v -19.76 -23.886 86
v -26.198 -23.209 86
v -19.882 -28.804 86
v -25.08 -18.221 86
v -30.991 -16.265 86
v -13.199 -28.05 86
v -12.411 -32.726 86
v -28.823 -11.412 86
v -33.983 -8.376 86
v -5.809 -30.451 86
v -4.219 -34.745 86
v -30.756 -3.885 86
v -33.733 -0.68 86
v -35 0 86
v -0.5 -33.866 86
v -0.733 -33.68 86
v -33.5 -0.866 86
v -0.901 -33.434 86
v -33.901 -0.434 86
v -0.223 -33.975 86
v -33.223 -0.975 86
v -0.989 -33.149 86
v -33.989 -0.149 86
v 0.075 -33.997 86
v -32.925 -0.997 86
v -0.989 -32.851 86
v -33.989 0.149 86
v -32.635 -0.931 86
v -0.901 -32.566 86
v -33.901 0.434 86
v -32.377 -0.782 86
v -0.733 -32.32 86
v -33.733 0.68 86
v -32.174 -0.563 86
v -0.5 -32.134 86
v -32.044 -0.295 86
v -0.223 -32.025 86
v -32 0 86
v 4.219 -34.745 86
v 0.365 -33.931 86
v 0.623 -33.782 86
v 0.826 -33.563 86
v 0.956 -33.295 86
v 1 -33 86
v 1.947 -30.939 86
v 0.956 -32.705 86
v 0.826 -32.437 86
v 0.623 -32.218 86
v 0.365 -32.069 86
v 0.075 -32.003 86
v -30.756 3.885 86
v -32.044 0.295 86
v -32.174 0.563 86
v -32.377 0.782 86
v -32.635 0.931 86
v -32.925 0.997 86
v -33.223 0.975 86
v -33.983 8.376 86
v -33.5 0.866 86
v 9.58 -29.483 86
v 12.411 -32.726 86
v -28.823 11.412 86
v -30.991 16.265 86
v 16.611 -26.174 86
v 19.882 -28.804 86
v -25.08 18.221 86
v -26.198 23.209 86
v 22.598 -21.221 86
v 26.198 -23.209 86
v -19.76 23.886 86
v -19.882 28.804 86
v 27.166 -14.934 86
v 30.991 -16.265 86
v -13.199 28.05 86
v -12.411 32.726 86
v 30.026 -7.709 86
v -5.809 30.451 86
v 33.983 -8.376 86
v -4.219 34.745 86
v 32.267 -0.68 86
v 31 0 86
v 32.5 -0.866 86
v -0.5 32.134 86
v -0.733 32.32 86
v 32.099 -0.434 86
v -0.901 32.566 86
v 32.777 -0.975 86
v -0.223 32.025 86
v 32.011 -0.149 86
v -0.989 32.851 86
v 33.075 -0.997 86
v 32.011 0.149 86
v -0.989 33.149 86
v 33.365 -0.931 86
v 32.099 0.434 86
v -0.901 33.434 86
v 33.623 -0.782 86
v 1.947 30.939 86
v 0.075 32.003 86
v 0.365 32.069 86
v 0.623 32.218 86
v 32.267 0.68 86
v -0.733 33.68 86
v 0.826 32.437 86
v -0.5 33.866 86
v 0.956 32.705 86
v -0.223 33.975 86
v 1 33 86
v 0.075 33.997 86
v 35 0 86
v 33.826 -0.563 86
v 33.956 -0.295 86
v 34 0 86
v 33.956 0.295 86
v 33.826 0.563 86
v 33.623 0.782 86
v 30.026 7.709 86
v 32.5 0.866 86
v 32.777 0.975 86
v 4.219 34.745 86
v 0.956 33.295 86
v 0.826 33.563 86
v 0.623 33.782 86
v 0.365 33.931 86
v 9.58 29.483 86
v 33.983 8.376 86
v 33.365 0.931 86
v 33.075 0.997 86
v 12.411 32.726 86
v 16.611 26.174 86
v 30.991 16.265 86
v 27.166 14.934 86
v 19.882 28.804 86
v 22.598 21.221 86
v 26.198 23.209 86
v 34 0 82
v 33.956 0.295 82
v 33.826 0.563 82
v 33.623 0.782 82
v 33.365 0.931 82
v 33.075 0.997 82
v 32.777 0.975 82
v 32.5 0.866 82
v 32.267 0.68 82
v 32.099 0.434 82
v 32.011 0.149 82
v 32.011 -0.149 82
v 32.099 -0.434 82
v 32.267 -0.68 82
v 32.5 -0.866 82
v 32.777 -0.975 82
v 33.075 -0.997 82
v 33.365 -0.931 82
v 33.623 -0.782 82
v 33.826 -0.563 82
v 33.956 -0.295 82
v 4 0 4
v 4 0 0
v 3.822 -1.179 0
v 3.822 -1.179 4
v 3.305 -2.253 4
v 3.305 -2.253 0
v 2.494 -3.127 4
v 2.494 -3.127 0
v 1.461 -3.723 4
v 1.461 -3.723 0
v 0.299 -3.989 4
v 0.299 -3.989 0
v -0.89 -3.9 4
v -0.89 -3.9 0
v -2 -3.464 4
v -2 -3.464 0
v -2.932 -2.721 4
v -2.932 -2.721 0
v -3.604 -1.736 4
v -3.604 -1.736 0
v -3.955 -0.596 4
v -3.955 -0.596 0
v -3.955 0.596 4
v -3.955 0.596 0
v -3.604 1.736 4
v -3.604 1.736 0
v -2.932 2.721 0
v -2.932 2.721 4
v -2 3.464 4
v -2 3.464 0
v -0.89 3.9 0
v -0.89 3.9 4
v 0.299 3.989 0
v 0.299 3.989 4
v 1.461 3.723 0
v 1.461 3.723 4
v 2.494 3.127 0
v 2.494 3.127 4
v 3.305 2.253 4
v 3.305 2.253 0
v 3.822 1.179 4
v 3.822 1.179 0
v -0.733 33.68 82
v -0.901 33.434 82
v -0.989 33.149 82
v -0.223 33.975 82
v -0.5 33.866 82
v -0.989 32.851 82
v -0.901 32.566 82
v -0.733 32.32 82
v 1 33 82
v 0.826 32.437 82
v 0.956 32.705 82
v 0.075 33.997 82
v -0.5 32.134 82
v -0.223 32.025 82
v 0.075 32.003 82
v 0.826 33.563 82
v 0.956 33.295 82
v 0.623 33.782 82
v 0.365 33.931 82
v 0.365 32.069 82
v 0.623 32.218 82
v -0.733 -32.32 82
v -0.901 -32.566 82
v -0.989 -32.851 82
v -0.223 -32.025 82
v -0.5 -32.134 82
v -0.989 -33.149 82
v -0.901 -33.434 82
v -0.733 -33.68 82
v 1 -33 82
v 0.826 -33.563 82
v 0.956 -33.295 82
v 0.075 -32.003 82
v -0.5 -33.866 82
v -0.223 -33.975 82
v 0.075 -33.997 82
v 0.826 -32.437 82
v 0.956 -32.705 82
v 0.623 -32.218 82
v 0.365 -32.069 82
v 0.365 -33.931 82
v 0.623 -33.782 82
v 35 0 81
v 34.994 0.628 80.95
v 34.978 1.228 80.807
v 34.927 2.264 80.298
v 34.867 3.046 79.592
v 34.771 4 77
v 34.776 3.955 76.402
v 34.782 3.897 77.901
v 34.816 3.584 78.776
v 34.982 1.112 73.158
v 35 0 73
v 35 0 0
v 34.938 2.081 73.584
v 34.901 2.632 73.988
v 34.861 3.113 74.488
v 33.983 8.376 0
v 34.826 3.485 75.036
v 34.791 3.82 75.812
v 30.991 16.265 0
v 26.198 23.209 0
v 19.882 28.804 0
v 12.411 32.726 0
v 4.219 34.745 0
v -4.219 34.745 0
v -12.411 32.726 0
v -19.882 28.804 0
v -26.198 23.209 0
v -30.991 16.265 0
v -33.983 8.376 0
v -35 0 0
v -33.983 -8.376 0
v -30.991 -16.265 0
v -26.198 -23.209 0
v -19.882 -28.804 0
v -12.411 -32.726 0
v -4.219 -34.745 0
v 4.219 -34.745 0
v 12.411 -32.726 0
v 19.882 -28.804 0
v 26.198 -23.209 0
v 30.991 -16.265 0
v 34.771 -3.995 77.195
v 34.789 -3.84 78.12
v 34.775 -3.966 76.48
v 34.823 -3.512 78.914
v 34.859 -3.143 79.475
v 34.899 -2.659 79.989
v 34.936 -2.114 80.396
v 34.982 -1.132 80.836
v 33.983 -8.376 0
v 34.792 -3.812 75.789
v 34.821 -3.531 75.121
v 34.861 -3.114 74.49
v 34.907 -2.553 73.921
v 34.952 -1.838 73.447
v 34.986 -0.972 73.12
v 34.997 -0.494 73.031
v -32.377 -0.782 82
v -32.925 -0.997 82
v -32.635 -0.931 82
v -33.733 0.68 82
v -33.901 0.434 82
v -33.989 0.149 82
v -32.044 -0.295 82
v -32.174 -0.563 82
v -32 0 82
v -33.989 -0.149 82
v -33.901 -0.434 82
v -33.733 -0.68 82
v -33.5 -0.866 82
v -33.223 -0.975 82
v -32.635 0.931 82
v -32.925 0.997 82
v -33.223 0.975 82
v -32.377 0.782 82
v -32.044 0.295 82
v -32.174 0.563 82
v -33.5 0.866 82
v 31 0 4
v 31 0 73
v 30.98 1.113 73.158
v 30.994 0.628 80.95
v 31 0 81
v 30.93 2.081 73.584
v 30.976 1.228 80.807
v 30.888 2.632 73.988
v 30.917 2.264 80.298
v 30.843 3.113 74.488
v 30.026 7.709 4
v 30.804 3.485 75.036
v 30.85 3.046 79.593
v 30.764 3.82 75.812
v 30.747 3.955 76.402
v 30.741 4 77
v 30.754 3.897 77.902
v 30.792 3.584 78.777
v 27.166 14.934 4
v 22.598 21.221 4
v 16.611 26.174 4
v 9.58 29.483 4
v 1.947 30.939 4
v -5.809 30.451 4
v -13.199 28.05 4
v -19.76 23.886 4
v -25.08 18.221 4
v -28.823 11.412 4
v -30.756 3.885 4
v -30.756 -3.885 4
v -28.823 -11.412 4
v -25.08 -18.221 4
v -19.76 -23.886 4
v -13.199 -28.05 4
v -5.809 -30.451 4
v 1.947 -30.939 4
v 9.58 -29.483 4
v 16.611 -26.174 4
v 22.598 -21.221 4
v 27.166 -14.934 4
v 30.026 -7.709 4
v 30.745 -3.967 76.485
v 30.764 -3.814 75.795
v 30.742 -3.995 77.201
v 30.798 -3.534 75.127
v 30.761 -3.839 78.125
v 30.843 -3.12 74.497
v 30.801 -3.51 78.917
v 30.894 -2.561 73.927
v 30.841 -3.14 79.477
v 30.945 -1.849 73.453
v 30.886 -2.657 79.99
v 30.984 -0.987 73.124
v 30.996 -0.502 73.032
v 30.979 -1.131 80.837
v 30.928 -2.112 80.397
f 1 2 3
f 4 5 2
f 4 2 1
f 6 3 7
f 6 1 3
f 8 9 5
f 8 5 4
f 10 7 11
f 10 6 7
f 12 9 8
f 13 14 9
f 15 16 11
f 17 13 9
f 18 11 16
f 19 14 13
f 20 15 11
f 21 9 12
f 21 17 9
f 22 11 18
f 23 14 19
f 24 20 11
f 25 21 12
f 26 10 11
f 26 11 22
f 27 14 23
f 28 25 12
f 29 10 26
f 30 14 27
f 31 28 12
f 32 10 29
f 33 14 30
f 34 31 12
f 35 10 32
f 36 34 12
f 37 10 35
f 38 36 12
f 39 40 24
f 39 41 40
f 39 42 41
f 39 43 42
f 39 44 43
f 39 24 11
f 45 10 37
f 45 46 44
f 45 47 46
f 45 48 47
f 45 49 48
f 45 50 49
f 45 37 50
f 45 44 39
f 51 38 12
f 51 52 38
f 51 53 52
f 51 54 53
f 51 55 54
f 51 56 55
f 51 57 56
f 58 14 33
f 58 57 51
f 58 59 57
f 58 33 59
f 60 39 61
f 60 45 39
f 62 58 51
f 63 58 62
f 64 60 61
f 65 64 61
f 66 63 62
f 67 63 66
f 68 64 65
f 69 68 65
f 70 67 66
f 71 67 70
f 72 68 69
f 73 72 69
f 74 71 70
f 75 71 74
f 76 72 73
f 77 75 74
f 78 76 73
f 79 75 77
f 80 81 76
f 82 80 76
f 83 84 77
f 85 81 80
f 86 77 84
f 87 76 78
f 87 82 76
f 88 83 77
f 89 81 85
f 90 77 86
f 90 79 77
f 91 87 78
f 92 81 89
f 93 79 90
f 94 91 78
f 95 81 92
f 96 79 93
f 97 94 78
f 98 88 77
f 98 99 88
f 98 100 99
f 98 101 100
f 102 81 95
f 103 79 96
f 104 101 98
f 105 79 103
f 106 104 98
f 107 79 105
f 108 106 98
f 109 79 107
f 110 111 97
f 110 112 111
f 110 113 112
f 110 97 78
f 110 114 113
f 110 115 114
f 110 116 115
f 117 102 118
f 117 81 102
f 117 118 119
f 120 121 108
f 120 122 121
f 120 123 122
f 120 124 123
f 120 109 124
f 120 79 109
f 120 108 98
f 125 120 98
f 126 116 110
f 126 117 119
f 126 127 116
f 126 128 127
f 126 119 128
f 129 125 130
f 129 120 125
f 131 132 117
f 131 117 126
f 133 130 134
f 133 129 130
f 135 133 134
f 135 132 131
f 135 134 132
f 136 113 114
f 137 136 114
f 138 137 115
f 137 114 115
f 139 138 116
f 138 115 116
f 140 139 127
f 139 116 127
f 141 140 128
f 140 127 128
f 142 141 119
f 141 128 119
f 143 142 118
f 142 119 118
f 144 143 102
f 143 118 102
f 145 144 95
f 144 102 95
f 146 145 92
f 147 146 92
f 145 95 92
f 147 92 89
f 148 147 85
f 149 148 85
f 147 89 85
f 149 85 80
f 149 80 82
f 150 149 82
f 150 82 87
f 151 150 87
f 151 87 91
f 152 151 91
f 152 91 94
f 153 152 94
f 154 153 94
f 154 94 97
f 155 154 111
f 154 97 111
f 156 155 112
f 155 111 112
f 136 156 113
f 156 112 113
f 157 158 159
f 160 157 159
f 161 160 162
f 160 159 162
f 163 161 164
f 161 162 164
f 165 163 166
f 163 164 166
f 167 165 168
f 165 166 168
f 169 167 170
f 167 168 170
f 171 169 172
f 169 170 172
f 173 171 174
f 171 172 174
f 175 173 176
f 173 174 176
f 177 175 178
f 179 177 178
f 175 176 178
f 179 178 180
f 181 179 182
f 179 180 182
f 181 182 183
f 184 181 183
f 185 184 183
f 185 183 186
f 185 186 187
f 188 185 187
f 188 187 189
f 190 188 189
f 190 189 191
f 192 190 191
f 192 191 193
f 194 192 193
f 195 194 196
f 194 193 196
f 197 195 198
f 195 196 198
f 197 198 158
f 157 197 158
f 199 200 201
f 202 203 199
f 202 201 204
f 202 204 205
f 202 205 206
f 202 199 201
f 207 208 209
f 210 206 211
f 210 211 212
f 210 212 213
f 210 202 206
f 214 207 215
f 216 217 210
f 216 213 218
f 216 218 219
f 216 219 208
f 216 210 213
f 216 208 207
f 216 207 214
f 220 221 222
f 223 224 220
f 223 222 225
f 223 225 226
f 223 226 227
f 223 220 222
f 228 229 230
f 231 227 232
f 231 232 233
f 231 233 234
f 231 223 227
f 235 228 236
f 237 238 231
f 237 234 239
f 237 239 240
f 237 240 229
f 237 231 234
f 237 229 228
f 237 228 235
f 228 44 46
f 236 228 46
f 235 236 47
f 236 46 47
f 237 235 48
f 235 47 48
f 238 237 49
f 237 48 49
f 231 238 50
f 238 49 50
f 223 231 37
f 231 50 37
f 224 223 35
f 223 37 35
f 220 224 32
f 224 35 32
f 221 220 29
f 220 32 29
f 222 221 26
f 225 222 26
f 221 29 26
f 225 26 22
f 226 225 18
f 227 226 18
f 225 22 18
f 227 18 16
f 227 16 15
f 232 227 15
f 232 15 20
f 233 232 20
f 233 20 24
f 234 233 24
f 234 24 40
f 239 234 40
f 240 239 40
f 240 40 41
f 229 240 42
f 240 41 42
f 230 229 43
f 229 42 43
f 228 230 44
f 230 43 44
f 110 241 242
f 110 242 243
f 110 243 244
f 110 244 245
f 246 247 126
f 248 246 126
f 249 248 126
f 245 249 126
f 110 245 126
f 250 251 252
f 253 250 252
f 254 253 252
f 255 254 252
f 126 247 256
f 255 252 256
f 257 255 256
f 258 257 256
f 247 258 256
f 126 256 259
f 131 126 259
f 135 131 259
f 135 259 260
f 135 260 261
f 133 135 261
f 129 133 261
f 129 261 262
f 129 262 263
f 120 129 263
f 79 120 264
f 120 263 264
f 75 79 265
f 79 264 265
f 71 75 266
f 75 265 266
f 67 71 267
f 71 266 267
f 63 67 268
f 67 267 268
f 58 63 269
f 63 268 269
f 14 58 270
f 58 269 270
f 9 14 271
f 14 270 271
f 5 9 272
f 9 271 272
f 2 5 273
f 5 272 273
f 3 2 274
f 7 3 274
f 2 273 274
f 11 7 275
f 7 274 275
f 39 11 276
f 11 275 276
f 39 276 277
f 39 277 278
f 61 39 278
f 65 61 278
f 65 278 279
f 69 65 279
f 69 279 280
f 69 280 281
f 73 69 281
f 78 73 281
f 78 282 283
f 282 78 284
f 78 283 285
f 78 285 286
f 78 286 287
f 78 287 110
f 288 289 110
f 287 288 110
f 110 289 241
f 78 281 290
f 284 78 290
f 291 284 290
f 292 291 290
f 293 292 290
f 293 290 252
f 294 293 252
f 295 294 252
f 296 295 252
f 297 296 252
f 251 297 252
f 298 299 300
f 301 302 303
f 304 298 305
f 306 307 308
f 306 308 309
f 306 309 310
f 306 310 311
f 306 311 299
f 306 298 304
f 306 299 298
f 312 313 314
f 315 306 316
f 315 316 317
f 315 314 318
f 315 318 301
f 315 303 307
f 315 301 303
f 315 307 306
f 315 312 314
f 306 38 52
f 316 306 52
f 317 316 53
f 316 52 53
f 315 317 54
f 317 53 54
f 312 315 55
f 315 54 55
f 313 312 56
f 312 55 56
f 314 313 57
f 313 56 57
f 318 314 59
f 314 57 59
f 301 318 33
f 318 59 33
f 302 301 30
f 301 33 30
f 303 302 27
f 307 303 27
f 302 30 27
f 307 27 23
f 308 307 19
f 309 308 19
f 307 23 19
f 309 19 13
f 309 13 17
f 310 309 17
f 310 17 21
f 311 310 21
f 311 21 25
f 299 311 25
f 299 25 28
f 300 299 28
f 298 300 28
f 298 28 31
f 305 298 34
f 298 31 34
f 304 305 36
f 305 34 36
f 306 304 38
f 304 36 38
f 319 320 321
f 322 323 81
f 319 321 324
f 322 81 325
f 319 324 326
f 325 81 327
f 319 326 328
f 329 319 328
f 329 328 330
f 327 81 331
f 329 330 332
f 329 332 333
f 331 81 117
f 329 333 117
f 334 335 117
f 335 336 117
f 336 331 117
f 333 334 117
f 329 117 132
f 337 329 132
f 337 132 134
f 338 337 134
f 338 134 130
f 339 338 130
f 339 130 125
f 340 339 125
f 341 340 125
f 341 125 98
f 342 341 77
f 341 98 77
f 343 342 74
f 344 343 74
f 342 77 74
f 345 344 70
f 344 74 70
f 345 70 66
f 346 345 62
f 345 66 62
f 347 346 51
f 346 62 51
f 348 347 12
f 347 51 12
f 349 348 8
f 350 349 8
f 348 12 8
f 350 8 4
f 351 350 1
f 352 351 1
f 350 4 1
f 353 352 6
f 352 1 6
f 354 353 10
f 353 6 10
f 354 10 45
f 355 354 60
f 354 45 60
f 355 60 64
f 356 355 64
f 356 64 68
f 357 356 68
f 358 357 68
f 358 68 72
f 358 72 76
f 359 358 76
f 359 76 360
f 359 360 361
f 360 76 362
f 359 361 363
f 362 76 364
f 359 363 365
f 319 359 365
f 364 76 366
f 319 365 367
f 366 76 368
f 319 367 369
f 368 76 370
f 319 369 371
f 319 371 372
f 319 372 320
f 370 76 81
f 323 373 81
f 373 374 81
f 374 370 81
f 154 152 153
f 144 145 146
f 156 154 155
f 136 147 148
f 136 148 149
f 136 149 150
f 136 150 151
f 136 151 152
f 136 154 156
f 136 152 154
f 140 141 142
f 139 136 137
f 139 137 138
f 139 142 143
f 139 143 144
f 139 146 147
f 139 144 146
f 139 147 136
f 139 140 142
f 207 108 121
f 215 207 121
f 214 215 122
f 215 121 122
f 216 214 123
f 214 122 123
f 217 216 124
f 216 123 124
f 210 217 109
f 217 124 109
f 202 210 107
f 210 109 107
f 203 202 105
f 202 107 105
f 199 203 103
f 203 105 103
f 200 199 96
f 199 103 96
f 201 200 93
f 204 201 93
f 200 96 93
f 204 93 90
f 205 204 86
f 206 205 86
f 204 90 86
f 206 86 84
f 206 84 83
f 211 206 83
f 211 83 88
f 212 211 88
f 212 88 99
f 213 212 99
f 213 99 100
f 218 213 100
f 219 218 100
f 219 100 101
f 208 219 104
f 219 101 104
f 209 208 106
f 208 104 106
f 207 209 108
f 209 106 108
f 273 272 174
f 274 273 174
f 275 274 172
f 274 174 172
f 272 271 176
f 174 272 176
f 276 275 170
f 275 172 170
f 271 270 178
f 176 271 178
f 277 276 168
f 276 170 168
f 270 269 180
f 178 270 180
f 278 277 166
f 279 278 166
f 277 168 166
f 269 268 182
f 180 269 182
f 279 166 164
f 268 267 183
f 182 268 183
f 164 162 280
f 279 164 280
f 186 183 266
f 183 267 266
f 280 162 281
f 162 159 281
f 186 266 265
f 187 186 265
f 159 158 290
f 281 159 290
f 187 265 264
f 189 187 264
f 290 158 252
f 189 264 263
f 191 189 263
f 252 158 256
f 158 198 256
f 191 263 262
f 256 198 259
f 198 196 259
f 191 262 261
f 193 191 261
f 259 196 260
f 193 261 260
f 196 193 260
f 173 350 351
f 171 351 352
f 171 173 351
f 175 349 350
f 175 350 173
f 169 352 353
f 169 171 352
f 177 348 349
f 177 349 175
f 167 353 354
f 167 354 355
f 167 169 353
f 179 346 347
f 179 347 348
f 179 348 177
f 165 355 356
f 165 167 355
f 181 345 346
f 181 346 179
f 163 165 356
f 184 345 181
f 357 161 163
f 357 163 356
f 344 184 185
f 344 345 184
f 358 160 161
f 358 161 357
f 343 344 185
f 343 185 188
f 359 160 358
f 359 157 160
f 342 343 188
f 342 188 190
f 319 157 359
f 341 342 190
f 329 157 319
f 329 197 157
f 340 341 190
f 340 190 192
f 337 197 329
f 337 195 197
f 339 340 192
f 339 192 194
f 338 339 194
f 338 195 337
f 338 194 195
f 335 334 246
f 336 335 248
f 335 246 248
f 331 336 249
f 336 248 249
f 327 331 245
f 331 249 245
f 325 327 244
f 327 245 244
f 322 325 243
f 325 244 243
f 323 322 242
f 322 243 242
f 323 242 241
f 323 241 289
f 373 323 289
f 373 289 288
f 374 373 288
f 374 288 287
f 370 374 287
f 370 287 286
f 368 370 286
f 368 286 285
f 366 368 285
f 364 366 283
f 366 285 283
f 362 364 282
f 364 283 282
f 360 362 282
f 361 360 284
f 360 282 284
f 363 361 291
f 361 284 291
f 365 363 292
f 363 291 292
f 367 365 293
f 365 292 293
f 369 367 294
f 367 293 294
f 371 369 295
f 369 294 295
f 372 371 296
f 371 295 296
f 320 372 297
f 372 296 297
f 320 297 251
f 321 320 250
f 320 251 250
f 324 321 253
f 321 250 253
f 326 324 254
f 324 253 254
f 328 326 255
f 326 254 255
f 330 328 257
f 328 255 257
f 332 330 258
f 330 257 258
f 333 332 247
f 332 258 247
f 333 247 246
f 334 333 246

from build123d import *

# Parameters (mm, degrees)
F0_R      = 35
F1_DEPTH  = 86
F2_R      = 31
F3_DEPTH  = 82
F4_R      = 4
F5_DEPTH  = 4
F6_R      = 1
F7_DEPTH  = 4
F9_R      = 4
F10_DEPTH = 4.2601478021


with BuildPart() as f1:
    # F0 (on Top) → F1 (new body)
    with BuildSketch(Plane.XY):
        Circle(F0_R)
    extrude(amount=F1_DEPTH)

    # F2 (on face) → F3 (cut)
    with BuildSketch(Plane.XY.offset(86)):
        Circle(F2_R)
    extrude(amount=-F3_DEPTH, mode=Mode.SUBTRACT)

    # F4 (on face) → F5 (cut, through all)
    with BuildSketch(Plane(origin=(0, 0, 0), x_dir=(1, 0, 0), z_dir=(0, 0, -1))):
        Circle(F4_R)
    extrude(amount=-F5_DEPTH, mode=Mode.SUBTRACT)

    # F6 (on face) → F7 (cut)
    with BuildSketch(Plane.XY.offset(86)):
        with Locations((0, 33)):
            Circle(F6_R)
        with Locations((-33, 0)):
            Circle(F6_R)
        with Locations((0, -33)):
            Circle(F6_R)
        with Locations((33, 0)):
            Circle(F6_R)
    extrude(amount=-F7_DEPTH, mode=Mode.SUBTRACT)

    # F9 (on offset) → F10 (cut, through all)
    with BuildSketch(Plane.YZ.offset(35)):
        with Locations((0, 77)):
            Circle(F9_R)
    extrude(amount=-F10_DEPTH, mode=Mode.SUBTRACT)


solid = f1.part
